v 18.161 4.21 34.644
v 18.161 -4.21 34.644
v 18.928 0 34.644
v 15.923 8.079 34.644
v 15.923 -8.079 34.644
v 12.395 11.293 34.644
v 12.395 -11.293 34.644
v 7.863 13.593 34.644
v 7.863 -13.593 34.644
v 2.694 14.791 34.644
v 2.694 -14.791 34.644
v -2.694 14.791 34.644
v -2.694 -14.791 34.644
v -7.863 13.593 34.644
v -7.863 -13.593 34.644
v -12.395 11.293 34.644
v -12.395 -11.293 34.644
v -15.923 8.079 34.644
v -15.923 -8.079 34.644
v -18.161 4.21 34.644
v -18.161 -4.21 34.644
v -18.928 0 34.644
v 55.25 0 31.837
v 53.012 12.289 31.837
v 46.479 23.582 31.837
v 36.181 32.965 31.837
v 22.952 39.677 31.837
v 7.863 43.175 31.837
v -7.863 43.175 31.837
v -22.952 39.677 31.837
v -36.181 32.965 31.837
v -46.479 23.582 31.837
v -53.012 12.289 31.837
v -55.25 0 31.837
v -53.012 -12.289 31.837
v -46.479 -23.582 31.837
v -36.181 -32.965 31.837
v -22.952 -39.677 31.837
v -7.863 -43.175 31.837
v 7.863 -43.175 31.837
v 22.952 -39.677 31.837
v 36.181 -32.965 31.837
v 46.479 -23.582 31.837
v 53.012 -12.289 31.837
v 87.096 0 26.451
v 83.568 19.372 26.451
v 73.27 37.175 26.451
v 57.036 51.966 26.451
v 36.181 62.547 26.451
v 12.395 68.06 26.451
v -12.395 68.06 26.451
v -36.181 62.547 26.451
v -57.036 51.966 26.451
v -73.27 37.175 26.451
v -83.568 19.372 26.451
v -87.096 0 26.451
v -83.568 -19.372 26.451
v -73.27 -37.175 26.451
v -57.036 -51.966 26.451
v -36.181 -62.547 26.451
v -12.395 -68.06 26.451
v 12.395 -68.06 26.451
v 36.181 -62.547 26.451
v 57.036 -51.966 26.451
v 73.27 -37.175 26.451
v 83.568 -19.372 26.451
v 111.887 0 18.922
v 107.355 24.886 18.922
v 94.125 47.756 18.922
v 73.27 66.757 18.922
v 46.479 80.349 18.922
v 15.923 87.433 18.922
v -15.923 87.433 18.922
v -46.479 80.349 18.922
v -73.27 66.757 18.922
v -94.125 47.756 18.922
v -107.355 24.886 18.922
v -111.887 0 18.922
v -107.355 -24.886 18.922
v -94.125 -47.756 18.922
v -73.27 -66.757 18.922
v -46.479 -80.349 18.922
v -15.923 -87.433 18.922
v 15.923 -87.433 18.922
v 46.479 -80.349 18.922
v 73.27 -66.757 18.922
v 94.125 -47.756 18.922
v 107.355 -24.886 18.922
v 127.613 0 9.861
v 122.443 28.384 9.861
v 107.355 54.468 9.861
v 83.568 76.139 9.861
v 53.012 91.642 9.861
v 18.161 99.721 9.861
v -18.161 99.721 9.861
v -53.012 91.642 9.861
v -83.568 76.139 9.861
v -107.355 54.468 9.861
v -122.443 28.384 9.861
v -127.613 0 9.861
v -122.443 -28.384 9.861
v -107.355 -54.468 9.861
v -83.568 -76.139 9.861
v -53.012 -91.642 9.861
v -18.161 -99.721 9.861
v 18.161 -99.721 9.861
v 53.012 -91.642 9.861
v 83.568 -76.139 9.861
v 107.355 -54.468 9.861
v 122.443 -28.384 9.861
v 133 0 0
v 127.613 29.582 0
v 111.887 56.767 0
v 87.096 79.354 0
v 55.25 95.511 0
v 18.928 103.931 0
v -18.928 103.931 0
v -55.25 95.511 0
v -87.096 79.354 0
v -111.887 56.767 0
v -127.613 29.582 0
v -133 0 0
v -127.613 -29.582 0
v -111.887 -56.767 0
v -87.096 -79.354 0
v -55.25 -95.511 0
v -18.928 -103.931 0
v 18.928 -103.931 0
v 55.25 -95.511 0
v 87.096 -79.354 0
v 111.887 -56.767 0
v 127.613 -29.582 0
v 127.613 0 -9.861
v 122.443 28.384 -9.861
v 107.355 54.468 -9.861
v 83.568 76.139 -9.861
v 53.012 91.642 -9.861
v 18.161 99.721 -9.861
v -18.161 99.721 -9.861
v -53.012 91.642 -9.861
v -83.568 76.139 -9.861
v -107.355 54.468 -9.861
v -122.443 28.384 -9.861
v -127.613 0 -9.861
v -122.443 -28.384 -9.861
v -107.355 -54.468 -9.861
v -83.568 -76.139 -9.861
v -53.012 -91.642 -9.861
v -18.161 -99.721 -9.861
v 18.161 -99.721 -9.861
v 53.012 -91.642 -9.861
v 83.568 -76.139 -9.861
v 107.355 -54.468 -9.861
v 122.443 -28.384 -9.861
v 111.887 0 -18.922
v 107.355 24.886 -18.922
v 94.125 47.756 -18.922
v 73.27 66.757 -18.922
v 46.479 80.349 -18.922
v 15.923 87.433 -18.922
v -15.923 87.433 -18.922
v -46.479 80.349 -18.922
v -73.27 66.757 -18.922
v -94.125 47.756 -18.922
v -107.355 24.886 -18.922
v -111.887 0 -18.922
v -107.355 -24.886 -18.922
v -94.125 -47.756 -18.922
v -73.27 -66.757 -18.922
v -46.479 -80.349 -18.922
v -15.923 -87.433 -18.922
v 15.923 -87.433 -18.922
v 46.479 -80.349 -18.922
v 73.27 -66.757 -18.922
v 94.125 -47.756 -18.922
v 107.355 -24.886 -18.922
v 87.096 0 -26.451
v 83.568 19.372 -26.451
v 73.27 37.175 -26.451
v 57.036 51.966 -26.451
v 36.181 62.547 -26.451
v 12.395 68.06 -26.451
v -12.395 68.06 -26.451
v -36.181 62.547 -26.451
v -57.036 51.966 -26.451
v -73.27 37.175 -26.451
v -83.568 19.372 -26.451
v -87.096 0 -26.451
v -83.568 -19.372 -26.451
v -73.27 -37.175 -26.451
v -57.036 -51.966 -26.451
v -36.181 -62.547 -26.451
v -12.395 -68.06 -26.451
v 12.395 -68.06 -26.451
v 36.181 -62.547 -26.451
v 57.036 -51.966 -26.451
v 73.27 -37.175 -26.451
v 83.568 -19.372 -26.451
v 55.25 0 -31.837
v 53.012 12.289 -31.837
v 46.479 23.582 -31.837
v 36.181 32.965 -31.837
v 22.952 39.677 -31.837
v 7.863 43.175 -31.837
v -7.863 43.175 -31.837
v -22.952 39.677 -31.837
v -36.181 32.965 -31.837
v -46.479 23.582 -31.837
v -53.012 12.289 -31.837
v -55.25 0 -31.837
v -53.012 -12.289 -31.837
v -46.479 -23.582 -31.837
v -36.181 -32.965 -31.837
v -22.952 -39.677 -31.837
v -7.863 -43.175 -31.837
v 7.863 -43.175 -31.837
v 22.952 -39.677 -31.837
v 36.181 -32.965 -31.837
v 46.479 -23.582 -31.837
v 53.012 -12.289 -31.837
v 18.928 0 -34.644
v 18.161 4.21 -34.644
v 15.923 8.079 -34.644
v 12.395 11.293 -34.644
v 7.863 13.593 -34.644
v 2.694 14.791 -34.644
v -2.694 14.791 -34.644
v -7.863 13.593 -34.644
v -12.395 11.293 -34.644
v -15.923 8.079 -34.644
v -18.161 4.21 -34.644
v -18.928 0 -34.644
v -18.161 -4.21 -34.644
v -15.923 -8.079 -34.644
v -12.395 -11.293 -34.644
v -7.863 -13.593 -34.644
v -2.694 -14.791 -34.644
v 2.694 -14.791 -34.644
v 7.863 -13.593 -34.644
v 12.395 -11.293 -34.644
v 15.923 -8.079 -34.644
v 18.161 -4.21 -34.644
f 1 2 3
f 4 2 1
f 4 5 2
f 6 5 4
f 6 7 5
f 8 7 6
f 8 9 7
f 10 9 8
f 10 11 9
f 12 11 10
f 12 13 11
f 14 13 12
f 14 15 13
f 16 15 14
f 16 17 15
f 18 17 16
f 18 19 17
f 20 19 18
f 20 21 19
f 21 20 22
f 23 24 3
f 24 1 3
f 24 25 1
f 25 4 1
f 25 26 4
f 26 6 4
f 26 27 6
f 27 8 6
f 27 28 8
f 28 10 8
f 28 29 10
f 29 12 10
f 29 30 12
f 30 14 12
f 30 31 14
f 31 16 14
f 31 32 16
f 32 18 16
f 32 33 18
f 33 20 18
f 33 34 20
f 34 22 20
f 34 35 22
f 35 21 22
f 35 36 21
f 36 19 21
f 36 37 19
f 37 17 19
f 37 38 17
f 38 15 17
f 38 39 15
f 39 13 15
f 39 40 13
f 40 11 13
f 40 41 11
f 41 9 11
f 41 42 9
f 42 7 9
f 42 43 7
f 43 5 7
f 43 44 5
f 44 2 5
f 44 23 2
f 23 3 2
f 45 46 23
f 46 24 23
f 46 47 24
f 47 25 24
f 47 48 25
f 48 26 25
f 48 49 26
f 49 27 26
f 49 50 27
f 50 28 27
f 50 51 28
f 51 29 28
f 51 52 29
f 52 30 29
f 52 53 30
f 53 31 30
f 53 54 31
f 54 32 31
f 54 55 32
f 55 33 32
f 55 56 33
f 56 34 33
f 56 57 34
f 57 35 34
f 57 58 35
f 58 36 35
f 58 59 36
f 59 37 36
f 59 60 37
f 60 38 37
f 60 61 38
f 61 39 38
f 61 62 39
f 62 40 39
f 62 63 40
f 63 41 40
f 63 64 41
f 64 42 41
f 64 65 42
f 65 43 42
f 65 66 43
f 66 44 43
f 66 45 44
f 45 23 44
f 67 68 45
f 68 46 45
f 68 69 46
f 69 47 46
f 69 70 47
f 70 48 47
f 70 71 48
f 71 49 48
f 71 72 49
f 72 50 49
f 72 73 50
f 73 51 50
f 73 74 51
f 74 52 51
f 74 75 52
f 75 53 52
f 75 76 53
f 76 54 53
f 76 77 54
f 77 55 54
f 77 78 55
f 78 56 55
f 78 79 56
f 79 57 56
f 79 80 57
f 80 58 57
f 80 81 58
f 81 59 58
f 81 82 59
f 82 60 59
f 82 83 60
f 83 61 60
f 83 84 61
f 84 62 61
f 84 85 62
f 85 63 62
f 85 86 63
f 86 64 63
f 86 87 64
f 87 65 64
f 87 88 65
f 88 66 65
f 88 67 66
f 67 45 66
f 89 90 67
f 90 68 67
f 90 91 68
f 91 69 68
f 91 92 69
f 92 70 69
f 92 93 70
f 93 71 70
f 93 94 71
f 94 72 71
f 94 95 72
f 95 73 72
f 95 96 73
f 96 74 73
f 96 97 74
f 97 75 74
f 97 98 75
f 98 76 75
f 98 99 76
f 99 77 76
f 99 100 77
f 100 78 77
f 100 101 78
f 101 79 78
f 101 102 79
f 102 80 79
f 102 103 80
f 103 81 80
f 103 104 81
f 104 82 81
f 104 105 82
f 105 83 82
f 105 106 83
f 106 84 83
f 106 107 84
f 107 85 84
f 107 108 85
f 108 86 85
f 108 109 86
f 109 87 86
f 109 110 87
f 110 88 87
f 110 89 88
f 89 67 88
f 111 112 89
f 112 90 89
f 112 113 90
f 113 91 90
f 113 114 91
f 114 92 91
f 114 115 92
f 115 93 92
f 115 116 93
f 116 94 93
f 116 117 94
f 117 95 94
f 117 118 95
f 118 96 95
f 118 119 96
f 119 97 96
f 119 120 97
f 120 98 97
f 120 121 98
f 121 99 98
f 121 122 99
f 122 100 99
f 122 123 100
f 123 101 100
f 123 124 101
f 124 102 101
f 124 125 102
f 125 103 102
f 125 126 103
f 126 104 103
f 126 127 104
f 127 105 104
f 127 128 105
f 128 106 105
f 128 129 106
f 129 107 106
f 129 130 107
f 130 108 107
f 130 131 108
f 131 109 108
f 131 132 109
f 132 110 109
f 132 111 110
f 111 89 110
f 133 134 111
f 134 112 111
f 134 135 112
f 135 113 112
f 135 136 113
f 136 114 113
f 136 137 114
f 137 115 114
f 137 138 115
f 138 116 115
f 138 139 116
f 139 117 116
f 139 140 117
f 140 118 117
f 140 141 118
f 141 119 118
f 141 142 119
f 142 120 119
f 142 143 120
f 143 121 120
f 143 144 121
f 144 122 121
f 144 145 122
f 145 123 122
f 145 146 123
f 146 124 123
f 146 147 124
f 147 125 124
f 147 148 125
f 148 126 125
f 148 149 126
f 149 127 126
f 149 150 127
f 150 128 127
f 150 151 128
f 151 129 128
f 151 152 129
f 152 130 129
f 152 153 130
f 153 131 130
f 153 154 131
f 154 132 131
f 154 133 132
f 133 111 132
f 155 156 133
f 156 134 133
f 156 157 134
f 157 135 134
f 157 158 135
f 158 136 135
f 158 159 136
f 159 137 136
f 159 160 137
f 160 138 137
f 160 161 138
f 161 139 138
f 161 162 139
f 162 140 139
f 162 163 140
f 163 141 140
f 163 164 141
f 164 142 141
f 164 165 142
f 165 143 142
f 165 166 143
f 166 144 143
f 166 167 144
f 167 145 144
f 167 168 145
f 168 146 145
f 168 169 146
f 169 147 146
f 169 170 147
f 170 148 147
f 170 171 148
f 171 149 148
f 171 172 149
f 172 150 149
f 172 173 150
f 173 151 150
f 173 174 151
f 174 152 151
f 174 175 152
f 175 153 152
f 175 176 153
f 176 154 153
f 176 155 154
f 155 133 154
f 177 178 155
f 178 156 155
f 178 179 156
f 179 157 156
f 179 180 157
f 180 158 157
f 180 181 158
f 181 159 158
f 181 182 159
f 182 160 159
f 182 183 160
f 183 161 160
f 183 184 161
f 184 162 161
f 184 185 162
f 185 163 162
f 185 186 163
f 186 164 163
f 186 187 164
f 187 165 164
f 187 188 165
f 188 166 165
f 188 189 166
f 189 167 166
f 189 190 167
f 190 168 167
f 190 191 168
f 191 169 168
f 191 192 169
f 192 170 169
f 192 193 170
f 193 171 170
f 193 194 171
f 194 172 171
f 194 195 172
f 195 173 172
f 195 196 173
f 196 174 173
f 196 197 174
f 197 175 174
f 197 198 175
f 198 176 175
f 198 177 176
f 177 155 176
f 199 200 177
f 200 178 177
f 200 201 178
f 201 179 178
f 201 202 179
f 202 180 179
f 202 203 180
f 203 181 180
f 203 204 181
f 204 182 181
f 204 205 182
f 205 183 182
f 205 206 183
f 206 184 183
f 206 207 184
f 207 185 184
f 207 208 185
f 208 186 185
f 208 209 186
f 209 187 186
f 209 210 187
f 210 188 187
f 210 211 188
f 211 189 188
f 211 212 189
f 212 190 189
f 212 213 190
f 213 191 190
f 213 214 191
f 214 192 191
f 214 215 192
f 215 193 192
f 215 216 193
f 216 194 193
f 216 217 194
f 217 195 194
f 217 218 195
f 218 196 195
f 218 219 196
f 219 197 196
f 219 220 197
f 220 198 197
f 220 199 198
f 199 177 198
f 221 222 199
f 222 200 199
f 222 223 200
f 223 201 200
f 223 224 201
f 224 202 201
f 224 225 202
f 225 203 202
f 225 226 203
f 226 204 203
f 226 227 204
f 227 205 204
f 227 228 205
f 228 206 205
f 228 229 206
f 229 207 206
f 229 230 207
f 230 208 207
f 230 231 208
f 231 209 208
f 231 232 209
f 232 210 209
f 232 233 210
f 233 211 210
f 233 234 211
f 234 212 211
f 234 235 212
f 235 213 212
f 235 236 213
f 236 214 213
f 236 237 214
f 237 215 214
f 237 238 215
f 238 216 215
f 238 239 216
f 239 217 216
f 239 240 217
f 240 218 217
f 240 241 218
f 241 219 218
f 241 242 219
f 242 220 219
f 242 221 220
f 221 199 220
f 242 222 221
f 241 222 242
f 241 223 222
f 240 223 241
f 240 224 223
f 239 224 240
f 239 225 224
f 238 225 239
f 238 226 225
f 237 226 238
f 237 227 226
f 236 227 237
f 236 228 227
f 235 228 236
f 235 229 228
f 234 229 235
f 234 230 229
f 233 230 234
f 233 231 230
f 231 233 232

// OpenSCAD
// Generated by SolidPython 1.0.1 on 2020-07-29 00:46:54


scale(v = [19, 15, 5]) {
	sphere(r = 7);
}
/***********************************************
*********      SolidPython code:      **********
************************************************
 
# import packages: SolidPython
from solid import *
from solid.utils import *
from itertools import chain, combinations, permutations


class Resize:

    def __init__(self, scad_file):
        self.scad_file = scad_file
        #self.scad_file = import_scad(scad_file)
        # cone/cylinder param:
        self.r1 = 0
        self.r2 = 0
        self.h = 0
        # rectangular prism param:
        self.w = 0
        self.l = 0
        # ellipse param:
        self.r = 0

    # import OpenScad code (file name corresponds to shape)


    # classify shape + parameters
    def assign(self, param1, param2, param3):
        if self.scad_file == 'cone.scad':
            self.r1 = param1
            self.r2 = param2
            self.h = param3
        elif self.scad_file == 'cylinder.scad':
            self.r1 = param1
            self.r2 = param2
            self.h = param3
        elif self.scad_file == 'rectangularPrism.scad':
            self.h = param1
            self.l = param2
            self.w = param3
        else:
            self.r = param1
            self.h = param2

    # resize parameters
    def iterate(self):
        x = range(3, 20, 2)
        i = 1
        if self.scad_file == 'cone.scad':
            tempList = list(permutations(x, 2))
            for temp in tempList:
                param1 = temp[0]
                param2 = temp[1]
                filepath = 'produced_scad_files/' + 'cone' + str(param1) + '_' + str(param2) + '_' + '.scad'
                scad_render_to_file(cylinder(h=param1, r1=param2, r2=0), filepath)

        elif self.scad_file == 'cylinder.scad':
            tempList = list(permutations(x, 3))
            for temp in tempList:
                param1 = temp[0]
                param2 = temp[1]
                filepath = 'produced_scad_files/' + 'cylinder' + str(param1) + '_' + str(param2) + '_' + '.scad'
                scad_render_to_file(cylinder(h=param1, r1=param2, r2=param2), filepath)

        elif self.scad_file == 'rectangularPrism.scad':
            tempList = list(permutations(x, 3))
            for temp in tempList:
                param1 = temp[0]
                param2 = temp[1]
                param3 = temp[2]
                filepath = 'produced_scad_files/' + 'rectangularPrism' + str(param1) + '_' + str(param2) + '_' + str(
                    param3) + '.scad'
                scad_render_to_file(cube(size=(param1, param2, param3)), filepath)

        elif self.scad_file == 'ellipse.scad':
            tempList = list(permutations(x, 4))
            for temp in tempList:
                param1 = temp[0]
                param2 = temp[1]
                param3 = temp[2]
                param4 = temp[3]
                filepath = 'produced_scad_files/' + 'ellipse' + str(param1) + '_' + str(param2) + '_' + str(param3) + '_' + str(param4) + '.scad'
                scad_render_to_file(scale([param1, param2, param3])(sphere(r=param4)), filepath)

    def render_to_scadfile(self):
        scad_render_to_file(scad, 'example.scad') 
 
************************************************/
